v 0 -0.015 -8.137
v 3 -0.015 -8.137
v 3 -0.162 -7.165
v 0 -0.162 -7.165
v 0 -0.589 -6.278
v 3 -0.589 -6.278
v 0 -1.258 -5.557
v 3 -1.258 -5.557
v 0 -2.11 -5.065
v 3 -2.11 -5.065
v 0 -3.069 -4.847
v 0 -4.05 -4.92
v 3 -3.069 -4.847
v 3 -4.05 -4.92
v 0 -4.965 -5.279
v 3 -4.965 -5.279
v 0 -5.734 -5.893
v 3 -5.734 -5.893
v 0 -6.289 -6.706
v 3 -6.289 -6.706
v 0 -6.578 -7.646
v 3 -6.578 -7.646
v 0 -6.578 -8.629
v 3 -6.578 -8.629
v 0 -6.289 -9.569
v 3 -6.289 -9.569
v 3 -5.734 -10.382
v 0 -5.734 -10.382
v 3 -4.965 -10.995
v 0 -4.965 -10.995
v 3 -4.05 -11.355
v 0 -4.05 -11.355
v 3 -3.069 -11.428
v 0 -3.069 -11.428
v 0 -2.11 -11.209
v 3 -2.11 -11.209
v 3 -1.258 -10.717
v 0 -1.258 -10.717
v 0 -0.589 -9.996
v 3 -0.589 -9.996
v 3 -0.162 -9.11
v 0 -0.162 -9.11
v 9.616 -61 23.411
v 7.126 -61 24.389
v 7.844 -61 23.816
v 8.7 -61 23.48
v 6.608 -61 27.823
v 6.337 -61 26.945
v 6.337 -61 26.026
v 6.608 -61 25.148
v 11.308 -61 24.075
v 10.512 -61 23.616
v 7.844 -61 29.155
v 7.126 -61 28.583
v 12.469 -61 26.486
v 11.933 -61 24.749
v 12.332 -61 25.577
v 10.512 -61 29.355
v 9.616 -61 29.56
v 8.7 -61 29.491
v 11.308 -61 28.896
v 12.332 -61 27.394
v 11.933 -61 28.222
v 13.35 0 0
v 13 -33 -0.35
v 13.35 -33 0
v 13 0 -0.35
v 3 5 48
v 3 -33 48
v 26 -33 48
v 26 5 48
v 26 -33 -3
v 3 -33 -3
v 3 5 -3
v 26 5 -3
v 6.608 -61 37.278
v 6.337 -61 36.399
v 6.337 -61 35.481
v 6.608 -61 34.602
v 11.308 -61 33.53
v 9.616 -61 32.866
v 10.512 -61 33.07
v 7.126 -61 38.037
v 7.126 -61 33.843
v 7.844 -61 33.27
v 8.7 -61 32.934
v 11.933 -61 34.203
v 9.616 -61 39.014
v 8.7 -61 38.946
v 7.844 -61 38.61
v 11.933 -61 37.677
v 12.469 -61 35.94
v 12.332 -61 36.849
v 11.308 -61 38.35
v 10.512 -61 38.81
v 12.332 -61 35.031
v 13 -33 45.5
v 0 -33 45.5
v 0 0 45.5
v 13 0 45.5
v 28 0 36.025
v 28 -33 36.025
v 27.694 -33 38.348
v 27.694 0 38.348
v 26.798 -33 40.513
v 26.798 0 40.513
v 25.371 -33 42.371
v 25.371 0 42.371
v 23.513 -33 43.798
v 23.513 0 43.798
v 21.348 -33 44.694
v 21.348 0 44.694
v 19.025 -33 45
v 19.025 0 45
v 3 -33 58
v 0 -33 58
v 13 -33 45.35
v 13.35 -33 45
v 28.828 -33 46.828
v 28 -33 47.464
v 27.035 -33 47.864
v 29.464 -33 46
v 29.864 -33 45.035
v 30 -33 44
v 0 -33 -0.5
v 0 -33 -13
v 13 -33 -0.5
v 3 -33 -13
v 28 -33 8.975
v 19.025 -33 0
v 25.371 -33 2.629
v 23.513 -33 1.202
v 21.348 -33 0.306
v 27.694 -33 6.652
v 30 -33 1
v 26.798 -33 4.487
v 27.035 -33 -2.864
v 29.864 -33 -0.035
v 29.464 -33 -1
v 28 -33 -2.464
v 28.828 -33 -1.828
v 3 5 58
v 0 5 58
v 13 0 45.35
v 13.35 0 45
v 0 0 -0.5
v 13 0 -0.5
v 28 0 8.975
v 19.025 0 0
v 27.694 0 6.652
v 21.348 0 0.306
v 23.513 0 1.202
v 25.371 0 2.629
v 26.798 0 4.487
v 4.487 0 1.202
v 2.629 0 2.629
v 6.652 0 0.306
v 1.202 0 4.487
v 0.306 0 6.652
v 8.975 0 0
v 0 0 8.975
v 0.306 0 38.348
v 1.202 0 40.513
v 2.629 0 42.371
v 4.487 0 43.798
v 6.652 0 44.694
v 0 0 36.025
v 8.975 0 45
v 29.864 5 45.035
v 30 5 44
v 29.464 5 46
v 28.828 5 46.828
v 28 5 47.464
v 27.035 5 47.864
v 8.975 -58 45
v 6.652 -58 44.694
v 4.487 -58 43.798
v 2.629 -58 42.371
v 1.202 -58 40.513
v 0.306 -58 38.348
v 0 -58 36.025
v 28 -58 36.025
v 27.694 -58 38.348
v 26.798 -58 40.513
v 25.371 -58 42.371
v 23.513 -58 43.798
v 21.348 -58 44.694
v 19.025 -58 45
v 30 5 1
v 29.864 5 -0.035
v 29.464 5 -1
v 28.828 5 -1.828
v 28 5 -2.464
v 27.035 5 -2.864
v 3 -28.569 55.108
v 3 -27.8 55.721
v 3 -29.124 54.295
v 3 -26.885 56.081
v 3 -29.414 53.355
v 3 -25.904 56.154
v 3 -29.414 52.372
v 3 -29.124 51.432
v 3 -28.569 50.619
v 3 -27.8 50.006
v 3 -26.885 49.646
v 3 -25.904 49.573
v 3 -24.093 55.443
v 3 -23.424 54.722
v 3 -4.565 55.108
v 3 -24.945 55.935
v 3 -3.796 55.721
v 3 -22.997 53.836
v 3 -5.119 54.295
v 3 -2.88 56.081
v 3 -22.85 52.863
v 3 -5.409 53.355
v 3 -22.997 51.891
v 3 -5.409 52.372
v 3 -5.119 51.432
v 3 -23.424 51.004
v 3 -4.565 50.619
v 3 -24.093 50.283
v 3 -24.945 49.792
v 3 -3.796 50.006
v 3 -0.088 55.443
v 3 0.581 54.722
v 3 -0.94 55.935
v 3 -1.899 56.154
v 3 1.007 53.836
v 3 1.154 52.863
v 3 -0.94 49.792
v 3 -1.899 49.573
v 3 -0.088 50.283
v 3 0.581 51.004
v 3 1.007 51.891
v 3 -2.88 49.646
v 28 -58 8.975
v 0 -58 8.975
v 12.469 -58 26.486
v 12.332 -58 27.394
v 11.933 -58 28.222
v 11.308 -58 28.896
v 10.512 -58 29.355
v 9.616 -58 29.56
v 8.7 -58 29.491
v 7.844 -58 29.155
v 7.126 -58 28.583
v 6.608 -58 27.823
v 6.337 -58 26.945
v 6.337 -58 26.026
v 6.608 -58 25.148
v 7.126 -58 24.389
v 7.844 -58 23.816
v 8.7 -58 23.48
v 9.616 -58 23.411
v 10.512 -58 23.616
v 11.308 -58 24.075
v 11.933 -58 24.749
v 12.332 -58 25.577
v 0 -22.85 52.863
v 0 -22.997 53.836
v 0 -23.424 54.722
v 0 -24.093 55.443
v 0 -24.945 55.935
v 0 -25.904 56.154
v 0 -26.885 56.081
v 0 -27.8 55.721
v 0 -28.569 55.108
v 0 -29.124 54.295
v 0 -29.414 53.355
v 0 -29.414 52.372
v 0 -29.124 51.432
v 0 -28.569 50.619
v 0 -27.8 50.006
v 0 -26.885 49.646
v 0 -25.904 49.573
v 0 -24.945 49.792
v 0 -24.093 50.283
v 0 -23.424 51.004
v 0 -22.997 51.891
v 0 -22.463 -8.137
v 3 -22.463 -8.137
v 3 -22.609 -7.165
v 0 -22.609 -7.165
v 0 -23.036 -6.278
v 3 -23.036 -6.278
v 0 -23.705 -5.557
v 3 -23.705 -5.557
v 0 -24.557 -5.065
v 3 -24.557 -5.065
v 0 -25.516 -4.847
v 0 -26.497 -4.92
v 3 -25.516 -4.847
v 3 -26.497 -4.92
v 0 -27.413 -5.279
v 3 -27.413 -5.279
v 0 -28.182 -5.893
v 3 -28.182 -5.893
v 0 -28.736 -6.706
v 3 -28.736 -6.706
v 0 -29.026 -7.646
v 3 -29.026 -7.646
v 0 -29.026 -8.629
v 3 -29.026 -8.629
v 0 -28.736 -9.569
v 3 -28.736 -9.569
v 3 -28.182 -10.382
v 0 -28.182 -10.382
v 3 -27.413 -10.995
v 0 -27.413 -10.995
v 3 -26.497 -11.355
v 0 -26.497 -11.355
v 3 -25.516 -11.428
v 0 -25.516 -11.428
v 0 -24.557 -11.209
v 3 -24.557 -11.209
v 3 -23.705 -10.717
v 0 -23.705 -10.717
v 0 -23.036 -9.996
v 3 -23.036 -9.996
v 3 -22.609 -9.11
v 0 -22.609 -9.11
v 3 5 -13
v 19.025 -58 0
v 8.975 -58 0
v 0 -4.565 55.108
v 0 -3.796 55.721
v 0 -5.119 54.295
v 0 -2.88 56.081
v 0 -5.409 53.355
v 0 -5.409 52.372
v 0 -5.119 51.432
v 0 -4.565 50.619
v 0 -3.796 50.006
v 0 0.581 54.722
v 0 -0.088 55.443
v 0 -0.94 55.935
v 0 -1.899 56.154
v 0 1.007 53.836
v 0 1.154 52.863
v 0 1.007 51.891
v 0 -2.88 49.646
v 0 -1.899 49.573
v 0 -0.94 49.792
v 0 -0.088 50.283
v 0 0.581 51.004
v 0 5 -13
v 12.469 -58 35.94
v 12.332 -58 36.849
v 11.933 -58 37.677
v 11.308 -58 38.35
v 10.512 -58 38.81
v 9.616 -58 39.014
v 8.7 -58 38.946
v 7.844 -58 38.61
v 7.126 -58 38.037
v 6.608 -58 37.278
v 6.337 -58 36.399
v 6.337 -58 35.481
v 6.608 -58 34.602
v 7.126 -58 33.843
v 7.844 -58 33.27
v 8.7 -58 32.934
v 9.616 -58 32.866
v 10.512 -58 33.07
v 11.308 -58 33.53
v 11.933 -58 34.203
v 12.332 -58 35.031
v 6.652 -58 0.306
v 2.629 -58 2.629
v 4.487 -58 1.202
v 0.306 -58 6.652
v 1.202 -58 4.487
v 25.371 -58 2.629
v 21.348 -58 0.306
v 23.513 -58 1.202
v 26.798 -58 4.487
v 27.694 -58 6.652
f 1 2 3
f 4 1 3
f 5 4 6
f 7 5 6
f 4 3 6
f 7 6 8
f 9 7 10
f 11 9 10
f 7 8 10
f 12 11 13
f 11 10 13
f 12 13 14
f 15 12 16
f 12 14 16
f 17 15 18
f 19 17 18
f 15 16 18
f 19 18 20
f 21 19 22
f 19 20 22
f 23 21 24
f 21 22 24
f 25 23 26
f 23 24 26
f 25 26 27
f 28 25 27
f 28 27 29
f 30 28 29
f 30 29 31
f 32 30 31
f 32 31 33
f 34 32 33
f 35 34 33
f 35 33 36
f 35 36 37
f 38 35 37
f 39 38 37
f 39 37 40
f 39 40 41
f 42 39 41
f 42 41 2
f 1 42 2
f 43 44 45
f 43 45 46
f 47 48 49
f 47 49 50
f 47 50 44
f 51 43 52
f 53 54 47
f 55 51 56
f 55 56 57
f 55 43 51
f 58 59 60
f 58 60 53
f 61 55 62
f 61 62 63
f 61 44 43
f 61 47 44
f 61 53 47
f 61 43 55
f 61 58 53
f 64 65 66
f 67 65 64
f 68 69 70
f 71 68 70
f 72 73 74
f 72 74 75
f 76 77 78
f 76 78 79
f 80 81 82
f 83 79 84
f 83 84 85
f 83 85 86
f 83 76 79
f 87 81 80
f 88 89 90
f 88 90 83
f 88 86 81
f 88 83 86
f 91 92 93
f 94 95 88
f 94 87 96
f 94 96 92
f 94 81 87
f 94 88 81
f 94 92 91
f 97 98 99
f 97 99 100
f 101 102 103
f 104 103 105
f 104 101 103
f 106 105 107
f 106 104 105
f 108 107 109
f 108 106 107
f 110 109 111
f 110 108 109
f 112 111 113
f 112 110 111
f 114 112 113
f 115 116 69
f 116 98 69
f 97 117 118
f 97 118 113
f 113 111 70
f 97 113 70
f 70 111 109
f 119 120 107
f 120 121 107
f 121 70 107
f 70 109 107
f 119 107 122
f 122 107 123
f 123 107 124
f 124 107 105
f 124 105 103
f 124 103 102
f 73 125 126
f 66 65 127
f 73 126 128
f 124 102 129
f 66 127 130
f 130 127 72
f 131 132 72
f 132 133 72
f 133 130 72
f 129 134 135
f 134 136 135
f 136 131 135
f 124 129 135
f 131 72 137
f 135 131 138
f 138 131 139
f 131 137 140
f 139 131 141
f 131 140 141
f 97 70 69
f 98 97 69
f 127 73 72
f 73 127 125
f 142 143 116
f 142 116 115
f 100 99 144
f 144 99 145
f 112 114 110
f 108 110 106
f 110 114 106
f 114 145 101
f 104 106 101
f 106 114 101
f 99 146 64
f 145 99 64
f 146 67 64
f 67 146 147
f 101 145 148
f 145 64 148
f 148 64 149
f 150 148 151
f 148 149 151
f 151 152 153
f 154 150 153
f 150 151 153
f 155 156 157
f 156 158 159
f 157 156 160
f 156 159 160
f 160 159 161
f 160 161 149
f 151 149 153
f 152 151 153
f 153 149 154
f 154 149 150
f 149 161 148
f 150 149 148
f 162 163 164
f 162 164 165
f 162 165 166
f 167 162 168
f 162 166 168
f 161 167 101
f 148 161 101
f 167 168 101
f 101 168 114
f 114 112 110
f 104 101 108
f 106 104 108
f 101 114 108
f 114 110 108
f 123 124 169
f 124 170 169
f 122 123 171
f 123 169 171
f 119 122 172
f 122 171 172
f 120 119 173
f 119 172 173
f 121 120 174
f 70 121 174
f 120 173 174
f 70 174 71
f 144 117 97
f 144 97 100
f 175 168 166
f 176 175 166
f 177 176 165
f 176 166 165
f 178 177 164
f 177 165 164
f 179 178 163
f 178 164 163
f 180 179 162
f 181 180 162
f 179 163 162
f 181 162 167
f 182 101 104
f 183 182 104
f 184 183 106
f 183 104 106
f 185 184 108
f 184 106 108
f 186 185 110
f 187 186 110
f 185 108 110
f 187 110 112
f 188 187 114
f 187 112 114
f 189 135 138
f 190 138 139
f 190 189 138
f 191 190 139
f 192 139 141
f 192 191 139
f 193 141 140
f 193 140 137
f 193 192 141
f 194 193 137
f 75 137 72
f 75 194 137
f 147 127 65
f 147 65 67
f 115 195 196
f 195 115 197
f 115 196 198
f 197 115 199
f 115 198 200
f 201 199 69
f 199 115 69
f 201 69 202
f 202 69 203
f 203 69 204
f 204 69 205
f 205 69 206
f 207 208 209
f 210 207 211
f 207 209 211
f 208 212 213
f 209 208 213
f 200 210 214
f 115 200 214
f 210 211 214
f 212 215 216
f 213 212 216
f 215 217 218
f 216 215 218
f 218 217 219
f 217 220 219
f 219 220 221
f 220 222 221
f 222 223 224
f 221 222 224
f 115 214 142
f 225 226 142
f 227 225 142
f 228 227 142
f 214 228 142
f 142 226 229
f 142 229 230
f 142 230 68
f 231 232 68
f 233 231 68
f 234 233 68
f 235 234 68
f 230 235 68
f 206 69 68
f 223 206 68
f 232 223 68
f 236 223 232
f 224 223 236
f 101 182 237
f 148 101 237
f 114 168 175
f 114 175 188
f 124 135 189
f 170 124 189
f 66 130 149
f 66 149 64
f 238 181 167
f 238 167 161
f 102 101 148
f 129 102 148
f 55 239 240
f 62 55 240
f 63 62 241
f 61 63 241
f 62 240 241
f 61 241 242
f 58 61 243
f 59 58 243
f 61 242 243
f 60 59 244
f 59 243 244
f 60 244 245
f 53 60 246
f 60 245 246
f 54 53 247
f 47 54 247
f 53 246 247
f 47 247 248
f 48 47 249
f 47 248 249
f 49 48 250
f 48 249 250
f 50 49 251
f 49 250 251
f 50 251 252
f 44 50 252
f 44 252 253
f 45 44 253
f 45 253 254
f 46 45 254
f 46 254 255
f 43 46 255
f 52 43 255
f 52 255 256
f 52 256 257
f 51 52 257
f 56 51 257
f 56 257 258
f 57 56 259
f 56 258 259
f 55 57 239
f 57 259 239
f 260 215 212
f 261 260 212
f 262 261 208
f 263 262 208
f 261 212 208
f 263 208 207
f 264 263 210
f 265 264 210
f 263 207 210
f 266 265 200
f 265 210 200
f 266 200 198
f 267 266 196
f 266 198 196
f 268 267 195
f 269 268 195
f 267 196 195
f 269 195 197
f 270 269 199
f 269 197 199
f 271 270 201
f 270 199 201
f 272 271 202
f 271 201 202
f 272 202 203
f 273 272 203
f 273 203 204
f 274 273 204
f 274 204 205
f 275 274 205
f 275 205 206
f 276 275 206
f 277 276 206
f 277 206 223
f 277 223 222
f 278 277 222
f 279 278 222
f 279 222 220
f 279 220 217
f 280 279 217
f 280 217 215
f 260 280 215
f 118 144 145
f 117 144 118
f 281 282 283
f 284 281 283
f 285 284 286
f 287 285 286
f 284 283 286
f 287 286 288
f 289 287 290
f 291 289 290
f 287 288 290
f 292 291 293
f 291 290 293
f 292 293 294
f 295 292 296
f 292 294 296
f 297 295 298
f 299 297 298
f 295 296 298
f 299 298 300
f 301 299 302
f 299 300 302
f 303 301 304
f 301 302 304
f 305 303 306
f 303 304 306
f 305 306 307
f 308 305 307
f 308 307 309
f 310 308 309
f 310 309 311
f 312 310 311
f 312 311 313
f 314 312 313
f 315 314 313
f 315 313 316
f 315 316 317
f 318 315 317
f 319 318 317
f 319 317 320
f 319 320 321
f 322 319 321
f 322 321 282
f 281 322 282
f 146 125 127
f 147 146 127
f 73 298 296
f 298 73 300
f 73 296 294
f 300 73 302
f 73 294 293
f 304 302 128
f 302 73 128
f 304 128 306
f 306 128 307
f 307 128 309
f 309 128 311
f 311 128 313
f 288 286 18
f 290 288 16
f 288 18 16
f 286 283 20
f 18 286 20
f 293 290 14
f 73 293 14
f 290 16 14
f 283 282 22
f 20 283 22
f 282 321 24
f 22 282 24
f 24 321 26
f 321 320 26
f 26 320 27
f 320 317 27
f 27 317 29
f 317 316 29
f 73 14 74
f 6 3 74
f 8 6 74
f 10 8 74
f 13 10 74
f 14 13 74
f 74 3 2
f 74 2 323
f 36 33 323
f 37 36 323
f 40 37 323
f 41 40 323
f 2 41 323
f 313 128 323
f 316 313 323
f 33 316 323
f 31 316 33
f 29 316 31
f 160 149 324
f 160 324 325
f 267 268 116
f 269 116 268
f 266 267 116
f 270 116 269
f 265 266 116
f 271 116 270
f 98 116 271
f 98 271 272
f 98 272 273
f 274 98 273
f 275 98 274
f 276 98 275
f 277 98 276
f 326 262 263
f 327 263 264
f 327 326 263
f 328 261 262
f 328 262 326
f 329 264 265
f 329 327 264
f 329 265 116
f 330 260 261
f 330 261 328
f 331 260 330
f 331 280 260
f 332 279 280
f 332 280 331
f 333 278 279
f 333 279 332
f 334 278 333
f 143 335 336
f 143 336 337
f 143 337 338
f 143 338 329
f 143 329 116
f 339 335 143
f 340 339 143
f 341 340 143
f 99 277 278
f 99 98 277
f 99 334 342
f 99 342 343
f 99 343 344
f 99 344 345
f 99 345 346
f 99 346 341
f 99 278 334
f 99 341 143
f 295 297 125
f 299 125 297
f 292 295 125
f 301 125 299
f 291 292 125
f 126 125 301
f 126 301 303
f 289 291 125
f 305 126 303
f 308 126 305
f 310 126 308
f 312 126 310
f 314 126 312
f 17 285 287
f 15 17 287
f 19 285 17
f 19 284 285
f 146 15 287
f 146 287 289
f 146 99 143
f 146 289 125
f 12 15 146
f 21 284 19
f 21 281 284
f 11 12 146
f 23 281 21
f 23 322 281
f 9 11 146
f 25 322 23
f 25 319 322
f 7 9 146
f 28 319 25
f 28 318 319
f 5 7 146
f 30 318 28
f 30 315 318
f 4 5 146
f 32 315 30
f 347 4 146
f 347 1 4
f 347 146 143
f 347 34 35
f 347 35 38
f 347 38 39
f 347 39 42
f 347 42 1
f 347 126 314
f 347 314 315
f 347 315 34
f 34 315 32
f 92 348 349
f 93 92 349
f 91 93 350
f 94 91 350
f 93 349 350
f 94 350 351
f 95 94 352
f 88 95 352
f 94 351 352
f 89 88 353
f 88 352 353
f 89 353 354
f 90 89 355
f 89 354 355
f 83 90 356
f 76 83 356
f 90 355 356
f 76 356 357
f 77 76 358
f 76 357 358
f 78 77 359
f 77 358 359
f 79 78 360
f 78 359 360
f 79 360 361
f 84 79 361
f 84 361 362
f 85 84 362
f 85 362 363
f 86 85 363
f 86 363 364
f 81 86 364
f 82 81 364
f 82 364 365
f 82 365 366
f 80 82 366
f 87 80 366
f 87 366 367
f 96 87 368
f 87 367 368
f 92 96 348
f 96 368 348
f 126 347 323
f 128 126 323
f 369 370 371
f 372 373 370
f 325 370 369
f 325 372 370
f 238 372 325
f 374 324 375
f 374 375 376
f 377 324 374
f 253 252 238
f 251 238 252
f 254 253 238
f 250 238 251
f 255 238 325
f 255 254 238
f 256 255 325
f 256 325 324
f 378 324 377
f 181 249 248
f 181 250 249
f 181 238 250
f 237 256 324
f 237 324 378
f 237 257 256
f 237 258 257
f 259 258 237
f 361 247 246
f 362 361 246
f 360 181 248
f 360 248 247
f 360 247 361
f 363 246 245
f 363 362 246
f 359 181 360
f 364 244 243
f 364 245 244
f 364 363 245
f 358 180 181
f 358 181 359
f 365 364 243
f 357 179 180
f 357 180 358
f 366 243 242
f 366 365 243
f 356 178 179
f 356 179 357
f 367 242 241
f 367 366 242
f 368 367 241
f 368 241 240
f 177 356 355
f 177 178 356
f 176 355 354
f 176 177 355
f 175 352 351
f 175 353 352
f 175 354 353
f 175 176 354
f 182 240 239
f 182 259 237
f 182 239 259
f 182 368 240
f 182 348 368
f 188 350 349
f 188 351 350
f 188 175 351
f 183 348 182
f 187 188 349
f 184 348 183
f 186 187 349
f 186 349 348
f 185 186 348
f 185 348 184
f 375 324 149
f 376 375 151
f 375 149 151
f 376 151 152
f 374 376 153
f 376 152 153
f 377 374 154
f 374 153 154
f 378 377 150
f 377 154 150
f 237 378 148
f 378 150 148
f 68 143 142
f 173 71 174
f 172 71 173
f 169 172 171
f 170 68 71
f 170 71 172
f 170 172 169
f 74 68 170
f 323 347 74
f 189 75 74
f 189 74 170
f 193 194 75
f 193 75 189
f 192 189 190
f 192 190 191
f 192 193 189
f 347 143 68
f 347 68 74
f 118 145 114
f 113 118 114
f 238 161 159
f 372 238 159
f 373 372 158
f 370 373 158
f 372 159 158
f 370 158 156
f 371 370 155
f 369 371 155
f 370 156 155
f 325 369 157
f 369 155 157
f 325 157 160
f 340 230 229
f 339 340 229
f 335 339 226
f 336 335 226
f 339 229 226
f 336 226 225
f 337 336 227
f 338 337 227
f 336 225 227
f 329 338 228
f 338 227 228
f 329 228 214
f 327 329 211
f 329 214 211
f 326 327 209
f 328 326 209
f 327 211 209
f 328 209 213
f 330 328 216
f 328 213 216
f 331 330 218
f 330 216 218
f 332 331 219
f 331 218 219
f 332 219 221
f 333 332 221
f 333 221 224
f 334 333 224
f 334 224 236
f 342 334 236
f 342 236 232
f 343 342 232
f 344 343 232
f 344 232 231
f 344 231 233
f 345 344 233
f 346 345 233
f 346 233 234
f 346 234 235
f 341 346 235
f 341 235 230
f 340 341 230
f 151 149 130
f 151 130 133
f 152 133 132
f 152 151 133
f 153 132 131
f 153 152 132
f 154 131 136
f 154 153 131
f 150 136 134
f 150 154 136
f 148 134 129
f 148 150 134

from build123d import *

# Parameters (mm, degrees)
PAD002_DEPTH    = 58
SKETCH005_R     = 3.082866
PAD003_DEPTH    = 3
BOX001_W        = 15
BOX001_H        = 38
BOX001_DEPTH    = 46
PAD_DEPTH       = 58
SKETCH001_R     = 3.082866
PAD001_DEPTH    = 3
BOX_W           = 30
BOX_H           = 38
BOX_DEPTH       = 51
FILLET_R        = 4
CHAMFER_SIZE    = 0.35
CHAMFER001_SIZE = 0.35
BOX003_W        = 3
BOX003_H        = 38
BOX003_DEPTH    = 10
SKETCH003_R     = 3.3
POCKET001_DEPTH = 5
BOX002_W        = 3
BOX002_H        = 38
BOX002_DEPTH    = 10
SKETCH002_R     = 3.3
POCKET_DEPTH    = 5


with BuildPart() as pad003:
    # Sketch004 → Pad002 (new body)
    with BuildSketch(Plane.XZ):
        with BuildLine():
            ThreePointArc((8.974731, 45), (2.628638, 42.371362), (0, 36.025269))
            Line((0, 36.025269), (0, 8.974751))
            ThreePointArc((0, 8.974751), (2.628631, 2.628645), (8.974731, 0))
            Line((19.025269, 0), (8.974731, 0))
            ThreePointArc((19.025269, 0), (25.371369, 2.628644), (28, 8.974749))
            Line((28, 36.025267), (28, 8.974749))
            ThreePointArc((28, 36.025267), (25.371363, 42.371361), (19.025269, 45))
            Line((8.974731, 45), (19.025269, 45))
        make_face()
    extrude(amount=PAD002_DEPTH)

    # Sketch005 → Pad003 (new body)
    with BuildSketch(Plane.XZ.offset(58)):
        with Locations((9.385798, 35.940002)):
            Circle(SKETCH005_R)
        with Locations((9.385798, 26.48562)):
            Circle(SKETCH005_R)
    extrude(amount=PAD003_DEPTH)


with BuildPart() as cubo001:
    # Box001 → Box001 (new body)
    with BuildSketch(Plane(origin=(-2, -38, -0.5), x_dir=(1, 0, 0), z_dir=(0, 0, 1))):
        with Locations((7.5, 19)):
            Rectangle(BOX001_W, BOX001_H)
    extrude(amount=BOX001_DEPTH)


with BuildPart() as pad001:
    # Sketch → Pad (new body)
    with BuildSketch(Plane.XZ):
        with BuildLine():
            ThreePointArc((8.974731, 45), (2.628638, 42.371362), (0, 36.025269))
            Line((0, 36.025269), (0, 8.974751))
            ThreePointArc((0, 8.974751), (2.628631, 2.628645), (8.974731, 0))
            Line((19.025269, 0), (8.974731, 0))
            ThreePointArc((19.025269, 0), (25.371369, 2.628644), (28, 8.974749))
            Line((28, 36.025267), (28, 8.974749))
            ThreePointArc((28, 36.025267), (25.371363, 42.371361), (19.025269, 45))
            Line((8.974731, 45), (19.025269, 45))
        make_face()
    extrude(amount=PAD_DEPTH)

    # Sketch001 → Pad001 (new body)
    with BuildSketch(Plane.XZ.offset(58)):
        with Locations((9.385798, 35.940002)):
            Circle(SKETCH001_R)
        with Locations((9.385798, 26.48562)):
            Circle(SKETCH001_R)
    extrude(amount=PAD001_DEPTH)


with BuildPart() as chamfer001:
    # Box → Box (new body)
    with BuildSketch(Plane(origin=(0, -33, -3), x_dir=(1, 0, 0), z_dir=(0, 0, 1))):
        with Locations((15, 19)):
            Rectangle(BOX_W, BOX_H)
    extrude(amount=BOX_DEPTH)

    # Fillet
    fillet_edges = [chamfer001.edges().sort_by_distance(p)[0] for p in [
        (30, -14, 48),
        (30, -14, -3),
    ]]
    fillet(fillet_edges, radius=FILLET_R)

    # Cut: cut Pad001
    add(pad001.part, mode=Mode.SUBTRACT)

    # Cut001: cut Cubo001
    add(cubo001.part, mode=Mode.SUBTRACT)

    # Chamfer
    chamfer_edges = [chamfer001.edges().sort_by_distance(p)[0] for p in [
        (13, -16.5, 45),
    ]]
    chamfer(chamfer_edges, length=CHAMFER_SIZE)

    # Chamfer001
    chamfer001_edges = [chamfer001.edges().sort_by_distance(p)[0] for p in [
        (13, -16.5, 0),
    ]]
    chamfer(chamfer001_edges, length=CHAMFER001_SIZE)


with BuildPart() as pocket001:
    # Box003 → Box003 (new body)
    with BuildSketch(Plane(origin=(0, -33, 48), x_dir=(1, 0, 0), z_dir=(0, 0, 1))):
        with Locations((1.5, 19)):
            Rectangle(BOX003_W, BOX003_H)
    extrude(amount=BOX003_DEPTH)

    # Sketch003 → Pocket001 (cut)
    with BuildSketch(Plane(origin=(3, -33, 48), x_dir=(0, 1, 0), z_dir=(1, 0, 0))):
        with Locations((6.8496, 4.863392)):
            Circle(SKETCH003_R)
        with Locations((30.854015, 4.863392)):
            Circle(SKETCH003_R)
    extrude(amount=-POCKET001_DEPTH, mode=Mode.SUBTRACT)


with BuildPart() as fusion:
    # Box002 → Box002 (new body)
    with BuildSketch(Plane(origin=(0, -33, -13), x_dir=(1, 0, 0), z_dir=(0, 0, 1))):
        with Locations((1.5, 19)):
            Rectangle(BOX002_W, BOX002_H)
    extrude(amount=BOX002_DEPTH)

    # Sketch002 → Pocket (cut)
    with BuildSketch(Plane(origin=(3, -33, -13), x_dir=(0, 1, 0), z_dir=(1, 0, 0))):
        with Locations((7.237305, 4.862617)):
            Circle(SKETCH002_R)
        with Locations((29.684685, 4.862617)):
            Circle(SKETCH002_R)
        with Locations((7.886075, 65.846821)):
            Circle(SKETCH002_R)
        with Locations((30.333455, 65.846821)):
            Circle(SKETCH002_R)
    extrude(amount=-POCKET_DEPTH, mode=Mode.SUBTRACT)

    # Fusion: union Chamfer001, Pocket001
    add(chamfer001.part)
    add(pocket001.part)


solid = Compound([pad003.part, fusion.part])
